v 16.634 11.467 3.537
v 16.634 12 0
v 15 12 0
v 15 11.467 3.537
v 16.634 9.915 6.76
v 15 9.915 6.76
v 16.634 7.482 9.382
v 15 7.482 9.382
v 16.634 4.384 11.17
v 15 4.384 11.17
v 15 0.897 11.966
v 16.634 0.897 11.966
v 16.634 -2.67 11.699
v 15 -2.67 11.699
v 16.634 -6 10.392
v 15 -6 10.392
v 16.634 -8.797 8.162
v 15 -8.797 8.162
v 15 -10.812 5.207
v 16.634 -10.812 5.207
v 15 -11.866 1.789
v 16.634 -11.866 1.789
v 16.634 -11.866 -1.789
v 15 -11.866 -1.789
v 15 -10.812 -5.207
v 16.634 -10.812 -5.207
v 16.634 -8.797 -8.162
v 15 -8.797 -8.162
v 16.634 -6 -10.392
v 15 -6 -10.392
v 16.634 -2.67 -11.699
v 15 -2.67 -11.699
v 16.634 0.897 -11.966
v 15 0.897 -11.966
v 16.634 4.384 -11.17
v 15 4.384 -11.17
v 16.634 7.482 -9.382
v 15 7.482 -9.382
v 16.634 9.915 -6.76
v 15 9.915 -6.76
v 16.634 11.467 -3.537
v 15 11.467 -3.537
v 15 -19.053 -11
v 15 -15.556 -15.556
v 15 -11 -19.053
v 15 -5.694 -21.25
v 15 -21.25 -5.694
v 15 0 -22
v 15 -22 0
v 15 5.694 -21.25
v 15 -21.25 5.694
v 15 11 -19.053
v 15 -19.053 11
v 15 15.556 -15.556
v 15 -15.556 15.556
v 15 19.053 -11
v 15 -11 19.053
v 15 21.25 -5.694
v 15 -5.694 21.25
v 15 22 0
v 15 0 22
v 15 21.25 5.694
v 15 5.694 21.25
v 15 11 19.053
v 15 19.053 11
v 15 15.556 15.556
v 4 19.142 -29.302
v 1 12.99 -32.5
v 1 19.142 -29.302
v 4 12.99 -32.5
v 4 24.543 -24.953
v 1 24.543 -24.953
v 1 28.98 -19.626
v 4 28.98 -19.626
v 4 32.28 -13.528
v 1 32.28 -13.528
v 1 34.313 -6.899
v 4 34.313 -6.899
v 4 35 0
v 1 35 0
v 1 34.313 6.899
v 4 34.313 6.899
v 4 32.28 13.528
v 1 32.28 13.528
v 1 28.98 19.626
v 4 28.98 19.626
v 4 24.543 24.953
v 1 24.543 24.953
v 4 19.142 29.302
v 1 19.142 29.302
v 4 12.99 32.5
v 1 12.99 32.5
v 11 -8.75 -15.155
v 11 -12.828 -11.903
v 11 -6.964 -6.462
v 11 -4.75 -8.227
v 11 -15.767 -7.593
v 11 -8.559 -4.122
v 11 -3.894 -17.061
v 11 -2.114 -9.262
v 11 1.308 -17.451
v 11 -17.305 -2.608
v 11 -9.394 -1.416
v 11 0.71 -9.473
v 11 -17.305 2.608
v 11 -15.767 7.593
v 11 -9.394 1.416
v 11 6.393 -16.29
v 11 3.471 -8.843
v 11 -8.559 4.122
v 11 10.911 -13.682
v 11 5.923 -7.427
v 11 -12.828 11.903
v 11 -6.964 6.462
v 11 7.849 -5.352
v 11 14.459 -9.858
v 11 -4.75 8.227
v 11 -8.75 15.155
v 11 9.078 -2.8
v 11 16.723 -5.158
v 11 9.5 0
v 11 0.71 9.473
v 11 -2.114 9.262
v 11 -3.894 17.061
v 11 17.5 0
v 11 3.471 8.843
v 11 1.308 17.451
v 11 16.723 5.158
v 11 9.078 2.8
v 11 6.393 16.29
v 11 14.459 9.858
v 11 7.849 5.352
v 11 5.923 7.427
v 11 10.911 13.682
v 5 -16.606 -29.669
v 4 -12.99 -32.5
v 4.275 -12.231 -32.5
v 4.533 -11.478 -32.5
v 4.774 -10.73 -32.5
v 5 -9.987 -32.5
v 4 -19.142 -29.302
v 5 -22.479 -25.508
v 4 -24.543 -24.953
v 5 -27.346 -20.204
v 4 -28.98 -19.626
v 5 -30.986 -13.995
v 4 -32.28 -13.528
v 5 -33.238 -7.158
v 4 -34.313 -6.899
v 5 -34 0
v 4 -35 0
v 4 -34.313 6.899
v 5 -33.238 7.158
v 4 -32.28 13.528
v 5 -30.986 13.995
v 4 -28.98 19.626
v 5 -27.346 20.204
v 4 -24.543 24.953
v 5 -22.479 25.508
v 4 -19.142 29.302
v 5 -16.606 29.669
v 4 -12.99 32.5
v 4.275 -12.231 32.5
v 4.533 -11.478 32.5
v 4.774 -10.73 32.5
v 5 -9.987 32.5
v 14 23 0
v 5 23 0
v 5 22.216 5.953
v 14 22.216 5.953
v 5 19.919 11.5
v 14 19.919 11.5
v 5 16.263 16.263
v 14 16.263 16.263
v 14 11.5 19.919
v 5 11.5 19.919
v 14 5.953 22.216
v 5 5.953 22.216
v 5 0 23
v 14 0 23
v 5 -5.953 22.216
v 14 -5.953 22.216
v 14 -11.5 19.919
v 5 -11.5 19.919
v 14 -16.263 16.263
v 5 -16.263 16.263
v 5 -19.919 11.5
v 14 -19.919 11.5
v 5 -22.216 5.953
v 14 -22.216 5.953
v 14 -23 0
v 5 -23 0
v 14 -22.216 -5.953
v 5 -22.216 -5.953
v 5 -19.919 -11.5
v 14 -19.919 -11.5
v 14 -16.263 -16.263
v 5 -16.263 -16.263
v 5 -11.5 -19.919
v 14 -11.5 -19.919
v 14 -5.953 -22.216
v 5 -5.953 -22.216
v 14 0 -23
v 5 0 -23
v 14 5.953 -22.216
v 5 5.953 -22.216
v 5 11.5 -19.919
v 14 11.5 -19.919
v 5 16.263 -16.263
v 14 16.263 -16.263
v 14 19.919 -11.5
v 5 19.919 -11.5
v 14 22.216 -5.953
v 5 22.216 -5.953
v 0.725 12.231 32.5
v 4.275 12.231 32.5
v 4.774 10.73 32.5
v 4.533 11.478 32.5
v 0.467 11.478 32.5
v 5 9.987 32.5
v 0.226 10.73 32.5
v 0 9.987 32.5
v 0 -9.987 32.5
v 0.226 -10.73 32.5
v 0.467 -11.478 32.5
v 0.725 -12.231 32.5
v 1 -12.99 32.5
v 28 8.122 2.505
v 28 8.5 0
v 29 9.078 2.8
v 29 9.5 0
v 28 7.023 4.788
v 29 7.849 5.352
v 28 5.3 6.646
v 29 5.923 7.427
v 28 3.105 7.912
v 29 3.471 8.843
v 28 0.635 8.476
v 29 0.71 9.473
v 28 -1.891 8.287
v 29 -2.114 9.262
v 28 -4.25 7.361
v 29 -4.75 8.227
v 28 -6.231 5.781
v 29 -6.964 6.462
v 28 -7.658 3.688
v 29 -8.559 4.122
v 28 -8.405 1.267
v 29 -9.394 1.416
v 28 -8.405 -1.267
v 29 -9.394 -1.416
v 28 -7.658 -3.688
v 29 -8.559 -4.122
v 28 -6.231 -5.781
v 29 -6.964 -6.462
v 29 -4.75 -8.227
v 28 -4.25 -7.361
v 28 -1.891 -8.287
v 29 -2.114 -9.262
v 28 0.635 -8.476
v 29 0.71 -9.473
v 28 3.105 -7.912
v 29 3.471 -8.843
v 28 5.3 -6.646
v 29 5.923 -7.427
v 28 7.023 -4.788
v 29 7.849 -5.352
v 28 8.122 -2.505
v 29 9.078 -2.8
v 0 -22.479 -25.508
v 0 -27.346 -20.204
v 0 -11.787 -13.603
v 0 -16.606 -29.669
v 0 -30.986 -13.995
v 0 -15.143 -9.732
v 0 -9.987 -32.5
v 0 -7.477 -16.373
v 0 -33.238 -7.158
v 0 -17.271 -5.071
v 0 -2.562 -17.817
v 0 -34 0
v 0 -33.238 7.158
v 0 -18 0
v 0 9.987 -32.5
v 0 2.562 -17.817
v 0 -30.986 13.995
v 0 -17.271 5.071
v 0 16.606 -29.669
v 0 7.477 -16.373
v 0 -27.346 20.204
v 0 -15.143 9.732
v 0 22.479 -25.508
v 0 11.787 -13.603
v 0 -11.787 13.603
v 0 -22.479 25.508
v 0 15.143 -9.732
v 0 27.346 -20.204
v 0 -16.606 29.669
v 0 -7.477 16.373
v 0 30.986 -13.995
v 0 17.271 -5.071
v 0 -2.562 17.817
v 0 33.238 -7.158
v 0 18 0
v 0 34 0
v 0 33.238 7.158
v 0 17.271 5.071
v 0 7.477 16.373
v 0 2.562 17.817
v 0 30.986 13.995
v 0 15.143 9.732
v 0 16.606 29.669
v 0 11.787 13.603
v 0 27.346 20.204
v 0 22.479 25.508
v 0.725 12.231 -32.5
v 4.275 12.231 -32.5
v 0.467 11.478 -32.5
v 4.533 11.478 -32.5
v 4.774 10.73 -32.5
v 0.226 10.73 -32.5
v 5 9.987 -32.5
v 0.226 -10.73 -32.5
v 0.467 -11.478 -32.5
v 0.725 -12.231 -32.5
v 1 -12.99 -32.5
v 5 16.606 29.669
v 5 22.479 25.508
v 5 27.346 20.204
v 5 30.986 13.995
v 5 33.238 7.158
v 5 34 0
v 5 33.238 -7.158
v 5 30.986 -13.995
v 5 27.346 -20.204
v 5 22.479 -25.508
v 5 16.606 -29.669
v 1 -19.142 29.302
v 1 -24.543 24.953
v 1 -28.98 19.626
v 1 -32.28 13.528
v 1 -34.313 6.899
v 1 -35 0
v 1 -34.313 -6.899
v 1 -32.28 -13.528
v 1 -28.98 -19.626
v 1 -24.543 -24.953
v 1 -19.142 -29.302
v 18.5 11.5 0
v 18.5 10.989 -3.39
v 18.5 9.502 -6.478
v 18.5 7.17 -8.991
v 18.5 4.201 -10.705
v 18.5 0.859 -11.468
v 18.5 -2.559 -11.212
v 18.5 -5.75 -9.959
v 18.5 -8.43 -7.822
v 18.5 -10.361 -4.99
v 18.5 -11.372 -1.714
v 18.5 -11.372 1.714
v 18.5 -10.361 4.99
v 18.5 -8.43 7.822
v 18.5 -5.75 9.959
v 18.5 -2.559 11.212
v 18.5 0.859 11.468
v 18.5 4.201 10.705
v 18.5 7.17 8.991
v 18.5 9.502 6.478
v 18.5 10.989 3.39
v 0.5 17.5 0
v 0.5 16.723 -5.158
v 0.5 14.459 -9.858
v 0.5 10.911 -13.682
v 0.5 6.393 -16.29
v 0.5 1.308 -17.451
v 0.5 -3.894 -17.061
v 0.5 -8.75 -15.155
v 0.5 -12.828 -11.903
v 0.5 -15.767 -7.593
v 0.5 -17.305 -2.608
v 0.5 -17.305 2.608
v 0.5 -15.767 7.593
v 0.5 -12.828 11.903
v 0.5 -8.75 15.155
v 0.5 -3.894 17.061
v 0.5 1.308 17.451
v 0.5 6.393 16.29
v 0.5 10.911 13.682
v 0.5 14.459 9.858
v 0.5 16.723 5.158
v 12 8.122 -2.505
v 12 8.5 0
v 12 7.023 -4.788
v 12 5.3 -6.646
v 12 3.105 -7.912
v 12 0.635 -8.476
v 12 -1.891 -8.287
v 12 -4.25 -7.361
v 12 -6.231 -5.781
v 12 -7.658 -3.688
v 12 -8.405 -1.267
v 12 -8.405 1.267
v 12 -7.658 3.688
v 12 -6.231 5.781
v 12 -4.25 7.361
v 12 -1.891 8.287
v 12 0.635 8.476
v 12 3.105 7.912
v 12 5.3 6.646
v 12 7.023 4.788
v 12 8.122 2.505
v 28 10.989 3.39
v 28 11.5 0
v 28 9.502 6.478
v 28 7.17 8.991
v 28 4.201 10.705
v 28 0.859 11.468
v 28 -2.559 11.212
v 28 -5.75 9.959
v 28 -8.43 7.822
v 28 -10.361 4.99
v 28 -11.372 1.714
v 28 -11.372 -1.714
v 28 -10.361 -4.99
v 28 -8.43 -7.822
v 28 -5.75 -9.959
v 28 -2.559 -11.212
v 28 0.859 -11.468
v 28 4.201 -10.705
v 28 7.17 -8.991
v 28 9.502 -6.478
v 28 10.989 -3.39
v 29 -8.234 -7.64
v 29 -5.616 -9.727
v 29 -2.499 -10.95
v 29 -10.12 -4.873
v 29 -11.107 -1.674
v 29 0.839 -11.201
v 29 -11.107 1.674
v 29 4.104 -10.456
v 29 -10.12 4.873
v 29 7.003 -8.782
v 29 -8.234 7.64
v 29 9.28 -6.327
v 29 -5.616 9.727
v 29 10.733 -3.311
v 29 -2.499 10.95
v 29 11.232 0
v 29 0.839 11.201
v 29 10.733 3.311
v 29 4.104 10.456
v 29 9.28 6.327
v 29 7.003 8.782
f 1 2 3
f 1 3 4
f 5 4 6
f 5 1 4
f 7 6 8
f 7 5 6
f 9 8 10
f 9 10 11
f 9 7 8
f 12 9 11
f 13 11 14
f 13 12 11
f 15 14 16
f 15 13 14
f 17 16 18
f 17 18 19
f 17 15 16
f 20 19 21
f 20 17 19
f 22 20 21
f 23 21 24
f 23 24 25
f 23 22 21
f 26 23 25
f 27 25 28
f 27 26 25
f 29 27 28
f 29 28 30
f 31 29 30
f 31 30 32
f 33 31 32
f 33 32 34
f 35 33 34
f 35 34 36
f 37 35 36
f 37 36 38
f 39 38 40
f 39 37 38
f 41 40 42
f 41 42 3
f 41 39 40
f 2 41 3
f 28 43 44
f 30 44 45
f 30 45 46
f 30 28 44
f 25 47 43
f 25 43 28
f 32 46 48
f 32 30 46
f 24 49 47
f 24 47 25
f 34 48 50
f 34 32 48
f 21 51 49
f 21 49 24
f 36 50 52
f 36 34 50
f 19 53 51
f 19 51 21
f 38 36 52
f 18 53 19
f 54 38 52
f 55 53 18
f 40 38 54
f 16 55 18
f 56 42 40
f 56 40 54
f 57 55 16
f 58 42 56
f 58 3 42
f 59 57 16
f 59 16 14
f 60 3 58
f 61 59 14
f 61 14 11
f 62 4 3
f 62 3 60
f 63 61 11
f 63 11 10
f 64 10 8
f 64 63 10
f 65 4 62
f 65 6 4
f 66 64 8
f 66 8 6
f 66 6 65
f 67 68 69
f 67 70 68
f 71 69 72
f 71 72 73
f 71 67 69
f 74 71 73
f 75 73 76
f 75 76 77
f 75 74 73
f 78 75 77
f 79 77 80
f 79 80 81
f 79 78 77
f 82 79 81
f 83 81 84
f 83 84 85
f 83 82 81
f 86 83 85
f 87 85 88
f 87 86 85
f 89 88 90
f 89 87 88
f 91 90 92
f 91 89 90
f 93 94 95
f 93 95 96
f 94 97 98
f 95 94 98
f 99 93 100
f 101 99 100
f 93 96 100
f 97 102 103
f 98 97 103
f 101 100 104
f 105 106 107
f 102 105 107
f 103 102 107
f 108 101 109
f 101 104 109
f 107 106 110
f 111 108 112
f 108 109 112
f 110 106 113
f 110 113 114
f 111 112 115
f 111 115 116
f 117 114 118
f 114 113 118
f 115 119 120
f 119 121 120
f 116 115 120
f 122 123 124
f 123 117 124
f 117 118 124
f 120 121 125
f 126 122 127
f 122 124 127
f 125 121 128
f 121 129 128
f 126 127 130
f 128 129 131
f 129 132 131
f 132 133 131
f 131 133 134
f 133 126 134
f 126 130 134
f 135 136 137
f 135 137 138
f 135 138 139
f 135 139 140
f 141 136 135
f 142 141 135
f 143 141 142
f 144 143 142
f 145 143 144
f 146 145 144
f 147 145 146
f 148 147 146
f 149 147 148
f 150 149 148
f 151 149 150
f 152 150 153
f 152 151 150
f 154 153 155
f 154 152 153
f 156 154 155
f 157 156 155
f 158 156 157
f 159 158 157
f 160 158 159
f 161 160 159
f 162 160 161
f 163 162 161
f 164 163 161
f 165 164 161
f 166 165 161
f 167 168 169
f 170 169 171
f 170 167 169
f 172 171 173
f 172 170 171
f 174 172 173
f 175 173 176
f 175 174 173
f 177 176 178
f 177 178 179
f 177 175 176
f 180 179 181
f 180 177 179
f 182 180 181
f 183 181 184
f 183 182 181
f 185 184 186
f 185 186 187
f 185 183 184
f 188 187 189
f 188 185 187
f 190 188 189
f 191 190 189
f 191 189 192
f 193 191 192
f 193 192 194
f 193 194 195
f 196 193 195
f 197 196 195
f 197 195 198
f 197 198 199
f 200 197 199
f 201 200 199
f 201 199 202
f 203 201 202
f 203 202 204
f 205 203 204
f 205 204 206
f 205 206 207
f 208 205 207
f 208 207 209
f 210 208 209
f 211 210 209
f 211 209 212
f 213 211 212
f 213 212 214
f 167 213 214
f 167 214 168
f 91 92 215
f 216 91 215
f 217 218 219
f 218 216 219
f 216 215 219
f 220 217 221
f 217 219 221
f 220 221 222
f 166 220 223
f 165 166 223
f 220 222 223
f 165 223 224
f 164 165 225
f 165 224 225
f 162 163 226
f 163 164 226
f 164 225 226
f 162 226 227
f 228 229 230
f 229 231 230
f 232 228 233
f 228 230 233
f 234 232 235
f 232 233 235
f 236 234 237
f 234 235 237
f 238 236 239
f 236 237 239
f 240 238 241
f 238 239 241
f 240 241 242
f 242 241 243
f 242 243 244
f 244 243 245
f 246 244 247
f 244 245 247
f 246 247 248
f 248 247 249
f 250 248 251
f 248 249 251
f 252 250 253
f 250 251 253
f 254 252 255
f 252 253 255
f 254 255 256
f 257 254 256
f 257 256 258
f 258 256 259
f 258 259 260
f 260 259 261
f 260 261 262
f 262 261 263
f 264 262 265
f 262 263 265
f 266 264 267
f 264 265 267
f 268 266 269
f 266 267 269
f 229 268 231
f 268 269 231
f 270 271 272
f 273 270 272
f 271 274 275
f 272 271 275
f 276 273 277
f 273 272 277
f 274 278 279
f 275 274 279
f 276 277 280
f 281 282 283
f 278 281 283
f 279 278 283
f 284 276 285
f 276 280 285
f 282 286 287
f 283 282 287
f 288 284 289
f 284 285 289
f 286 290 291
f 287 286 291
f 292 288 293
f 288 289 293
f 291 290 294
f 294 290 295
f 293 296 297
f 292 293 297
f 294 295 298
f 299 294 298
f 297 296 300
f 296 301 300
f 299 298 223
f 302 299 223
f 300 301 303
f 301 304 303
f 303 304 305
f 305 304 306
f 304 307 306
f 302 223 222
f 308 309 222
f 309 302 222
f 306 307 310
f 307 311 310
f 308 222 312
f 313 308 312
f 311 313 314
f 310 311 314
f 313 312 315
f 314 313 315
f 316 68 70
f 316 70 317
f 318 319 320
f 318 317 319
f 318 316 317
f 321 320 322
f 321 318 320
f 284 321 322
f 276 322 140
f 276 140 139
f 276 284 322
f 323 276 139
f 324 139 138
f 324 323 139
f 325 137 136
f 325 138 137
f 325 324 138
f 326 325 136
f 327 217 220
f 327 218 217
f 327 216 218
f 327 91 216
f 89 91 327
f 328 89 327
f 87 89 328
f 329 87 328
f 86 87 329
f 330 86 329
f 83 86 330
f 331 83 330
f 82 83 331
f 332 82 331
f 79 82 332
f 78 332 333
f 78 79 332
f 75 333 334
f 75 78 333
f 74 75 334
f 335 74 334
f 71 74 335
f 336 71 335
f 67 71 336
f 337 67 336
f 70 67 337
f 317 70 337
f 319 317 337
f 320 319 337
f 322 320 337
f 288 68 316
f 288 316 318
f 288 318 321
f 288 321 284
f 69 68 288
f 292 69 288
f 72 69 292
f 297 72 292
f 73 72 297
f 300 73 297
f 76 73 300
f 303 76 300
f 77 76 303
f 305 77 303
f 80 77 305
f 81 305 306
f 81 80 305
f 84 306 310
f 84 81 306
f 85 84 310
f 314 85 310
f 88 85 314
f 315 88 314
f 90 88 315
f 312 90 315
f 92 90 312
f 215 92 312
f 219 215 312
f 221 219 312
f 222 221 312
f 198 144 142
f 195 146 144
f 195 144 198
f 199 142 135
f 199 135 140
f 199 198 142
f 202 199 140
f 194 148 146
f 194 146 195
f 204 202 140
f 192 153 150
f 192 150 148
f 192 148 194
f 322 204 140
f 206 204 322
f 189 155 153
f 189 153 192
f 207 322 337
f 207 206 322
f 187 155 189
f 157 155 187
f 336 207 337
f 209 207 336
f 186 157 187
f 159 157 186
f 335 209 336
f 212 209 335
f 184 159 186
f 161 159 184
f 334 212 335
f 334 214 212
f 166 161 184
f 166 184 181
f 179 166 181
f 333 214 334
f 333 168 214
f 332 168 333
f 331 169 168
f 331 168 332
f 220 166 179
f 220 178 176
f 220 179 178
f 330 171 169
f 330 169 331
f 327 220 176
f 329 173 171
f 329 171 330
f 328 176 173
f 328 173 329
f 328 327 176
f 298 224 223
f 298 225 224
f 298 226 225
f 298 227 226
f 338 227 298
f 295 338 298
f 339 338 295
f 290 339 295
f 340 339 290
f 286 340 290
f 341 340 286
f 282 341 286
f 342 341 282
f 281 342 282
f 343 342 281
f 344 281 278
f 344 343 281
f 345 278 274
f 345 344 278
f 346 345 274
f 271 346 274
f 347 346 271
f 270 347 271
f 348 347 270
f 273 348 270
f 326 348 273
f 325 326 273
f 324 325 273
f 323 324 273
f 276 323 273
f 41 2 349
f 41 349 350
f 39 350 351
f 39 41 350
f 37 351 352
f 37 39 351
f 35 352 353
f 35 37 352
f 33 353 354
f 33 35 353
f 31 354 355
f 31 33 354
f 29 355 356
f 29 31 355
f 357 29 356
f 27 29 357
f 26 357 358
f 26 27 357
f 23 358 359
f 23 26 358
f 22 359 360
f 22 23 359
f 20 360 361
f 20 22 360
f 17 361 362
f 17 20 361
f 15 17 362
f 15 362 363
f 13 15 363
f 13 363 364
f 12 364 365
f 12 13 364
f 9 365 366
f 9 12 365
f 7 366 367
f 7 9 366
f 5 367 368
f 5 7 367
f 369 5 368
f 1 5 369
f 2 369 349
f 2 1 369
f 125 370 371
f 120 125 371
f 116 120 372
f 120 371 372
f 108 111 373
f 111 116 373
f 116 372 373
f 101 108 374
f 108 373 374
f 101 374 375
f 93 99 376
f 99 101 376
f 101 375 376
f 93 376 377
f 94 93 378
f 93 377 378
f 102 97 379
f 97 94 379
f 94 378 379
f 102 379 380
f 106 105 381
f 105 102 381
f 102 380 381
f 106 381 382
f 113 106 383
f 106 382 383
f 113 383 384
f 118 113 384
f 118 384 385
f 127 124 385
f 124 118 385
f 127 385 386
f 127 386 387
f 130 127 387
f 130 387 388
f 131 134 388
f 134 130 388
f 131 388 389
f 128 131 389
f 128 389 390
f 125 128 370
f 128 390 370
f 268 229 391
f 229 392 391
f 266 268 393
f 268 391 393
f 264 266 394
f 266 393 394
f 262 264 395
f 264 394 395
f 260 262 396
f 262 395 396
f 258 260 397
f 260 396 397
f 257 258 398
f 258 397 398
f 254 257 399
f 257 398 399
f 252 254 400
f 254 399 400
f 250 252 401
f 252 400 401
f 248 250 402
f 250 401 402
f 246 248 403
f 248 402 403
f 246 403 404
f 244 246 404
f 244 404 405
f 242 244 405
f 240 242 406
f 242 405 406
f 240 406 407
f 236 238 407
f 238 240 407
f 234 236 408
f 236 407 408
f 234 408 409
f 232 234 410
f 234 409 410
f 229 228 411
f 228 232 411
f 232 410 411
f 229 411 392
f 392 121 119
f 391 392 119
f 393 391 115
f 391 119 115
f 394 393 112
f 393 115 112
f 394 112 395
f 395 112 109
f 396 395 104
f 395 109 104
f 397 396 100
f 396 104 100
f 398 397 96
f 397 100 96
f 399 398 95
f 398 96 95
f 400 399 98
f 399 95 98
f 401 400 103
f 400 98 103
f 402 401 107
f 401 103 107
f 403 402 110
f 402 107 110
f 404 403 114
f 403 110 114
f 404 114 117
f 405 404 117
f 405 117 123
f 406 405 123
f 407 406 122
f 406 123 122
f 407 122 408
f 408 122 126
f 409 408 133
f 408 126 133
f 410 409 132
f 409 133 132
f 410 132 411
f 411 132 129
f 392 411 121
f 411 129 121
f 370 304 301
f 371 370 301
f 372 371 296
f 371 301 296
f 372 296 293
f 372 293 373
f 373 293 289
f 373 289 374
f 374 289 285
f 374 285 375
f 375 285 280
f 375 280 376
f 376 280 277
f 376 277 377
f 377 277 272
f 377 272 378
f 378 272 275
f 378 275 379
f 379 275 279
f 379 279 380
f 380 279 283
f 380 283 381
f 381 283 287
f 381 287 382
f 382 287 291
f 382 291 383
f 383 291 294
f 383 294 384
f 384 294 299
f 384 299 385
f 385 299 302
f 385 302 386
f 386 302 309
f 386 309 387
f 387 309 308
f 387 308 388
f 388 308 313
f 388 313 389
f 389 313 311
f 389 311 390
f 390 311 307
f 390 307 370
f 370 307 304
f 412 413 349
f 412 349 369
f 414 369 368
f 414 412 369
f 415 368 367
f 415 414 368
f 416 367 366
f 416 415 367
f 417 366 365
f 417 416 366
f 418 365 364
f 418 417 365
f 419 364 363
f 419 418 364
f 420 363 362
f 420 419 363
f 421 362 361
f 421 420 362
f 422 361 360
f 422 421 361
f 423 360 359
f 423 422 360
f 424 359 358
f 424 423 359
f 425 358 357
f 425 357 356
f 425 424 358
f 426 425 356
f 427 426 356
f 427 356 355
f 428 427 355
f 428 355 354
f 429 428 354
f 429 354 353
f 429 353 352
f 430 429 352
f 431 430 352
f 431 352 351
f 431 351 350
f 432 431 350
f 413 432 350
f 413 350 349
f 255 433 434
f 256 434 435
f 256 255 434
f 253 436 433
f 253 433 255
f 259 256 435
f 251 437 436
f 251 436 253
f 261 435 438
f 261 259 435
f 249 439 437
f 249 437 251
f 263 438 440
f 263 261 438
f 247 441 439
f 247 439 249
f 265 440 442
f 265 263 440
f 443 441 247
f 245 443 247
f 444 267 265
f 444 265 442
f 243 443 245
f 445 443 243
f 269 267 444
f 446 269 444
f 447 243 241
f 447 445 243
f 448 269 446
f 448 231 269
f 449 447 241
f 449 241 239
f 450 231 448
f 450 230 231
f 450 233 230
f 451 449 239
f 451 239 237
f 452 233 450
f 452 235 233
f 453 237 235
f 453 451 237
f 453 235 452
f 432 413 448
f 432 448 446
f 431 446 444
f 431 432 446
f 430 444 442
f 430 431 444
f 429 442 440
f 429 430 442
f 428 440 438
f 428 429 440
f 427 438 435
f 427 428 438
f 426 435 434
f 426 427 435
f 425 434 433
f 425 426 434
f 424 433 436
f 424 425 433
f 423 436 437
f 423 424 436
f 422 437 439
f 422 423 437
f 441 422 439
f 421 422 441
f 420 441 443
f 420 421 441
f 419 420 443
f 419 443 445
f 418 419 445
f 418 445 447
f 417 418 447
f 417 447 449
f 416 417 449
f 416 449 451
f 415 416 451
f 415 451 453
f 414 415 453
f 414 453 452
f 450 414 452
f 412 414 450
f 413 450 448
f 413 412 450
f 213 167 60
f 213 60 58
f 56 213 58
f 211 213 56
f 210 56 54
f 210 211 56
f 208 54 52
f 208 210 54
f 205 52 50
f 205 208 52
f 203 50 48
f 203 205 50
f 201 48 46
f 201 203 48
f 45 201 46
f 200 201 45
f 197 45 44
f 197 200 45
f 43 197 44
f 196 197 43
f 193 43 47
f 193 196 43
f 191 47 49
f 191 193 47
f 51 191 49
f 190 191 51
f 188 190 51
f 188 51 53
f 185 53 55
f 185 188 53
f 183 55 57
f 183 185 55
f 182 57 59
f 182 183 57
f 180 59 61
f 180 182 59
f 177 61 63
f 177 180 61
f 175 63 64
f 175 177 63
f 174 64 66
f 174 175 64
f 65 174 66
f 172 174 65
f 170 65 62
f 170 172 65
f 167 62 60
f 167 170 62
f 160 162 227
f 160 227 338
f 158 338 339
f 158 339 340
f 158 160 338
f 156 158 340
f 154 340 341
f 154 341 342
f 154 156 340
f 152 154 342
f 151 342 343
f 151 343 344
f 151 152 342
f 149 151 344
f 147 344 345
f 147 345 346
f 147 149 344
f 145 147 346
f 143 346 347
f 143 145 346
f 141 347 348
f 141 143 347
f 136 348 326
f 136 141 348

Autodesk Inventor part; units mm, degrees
ref_plane "YZ Plane" through (0, 0, 0) normal (1, 0, 0) x (0, 1, 0)
ref_plane "XZ Plane" through (0, 0, 0) normal (0, 1, 0) x (-1, 0, 0)
ref_plane "XY Plane" through (0, 0, 0) normal (0, 0, 1) x (1, 0, 0)
sketch "Náčrt1" plane through (0, 0, 0) normal (0, 0, 1) x (1, 0, 0)
  line L0 (0, 0) -> (16.9868, 0)
  line L1 (0, 17.5) -> (0, 35)
  line L2 (5, 23) -> (15, 23)
  line L3 (15, 23) -> (15, 12)
  line L4 (15, 12) -> (16.634, 12)
  line L5 (16.634, 12) -> (18.5, 11.5)
  line L6 (18.5, 11.5) -> (29, 11.5)
  line L7 (29, 11.5) -> (29, 8.5)
  line L8 (29, 8.5) -> (11, 8.5)
  line L9 (11, 8.5) -> (11, 17.5)
  line L10 (11, 17.5) -> (0, 17.5)
  line L11 (0, 35) -> (5, 35)
  line L12 (5, 35) -> (5, 23)
  dimension "d0" = 29
  dimension "d2" = 10.5
  dimension "d5" = 14
  dimension "d8" = 46
  dimension "d10" = 24
  dimension "d11" = 23
  dimension "d12" = 17
  dimension "d13" = 35
  dimension "d14" = 11
  dimension "d15" = 15
  dimension "d40" = 12.366
  dimension "d53" = 70
  dimension "d54" = 24
revolve "Rotace1" add sketch "Náčrt1" angle 360 about axis through (0, 0, 0) along (1, 0, 0)
chamfer "Zkosení3" distance 1 angle 45 1 edges at (15, -23, 0)
chamfer "Zkosení5" distance 1 angle 15 1 edges at (29, -11.5, 0) measured on face at (25.5, 11.4627, -0.9254)
chamfer "Zkosení6" distance 0.5 angle 45 1 edges at (0, -17.5, 0)
chamfer "Zkosení8" distance 1 angle 45 1 edges at (29, -8.5, 0)
chamfer "Zkosení9" distance 1 angle 45 1 edges at (11, -8.5, 0)
chamfer "Zkosení11" distance 1 angle 45 1 edges at (5, -35, 0)
chamfer "Zkosení12" distance 1 angle 45 1 edges at (0, -35, 0)
sketch "Náčrt3" plane through (0, 0, 0) normal (-1, 0, 0) x (0, 0, 1)
  line L0 (-39.3312, 12.9904) -> (-32.5, 12.9904)
  line L1 (-32.5, 12.9904) -> (-32.5, -12.9904)
  line L2 (-32.5, -12.9904) -> (-39.3312, -12.9904)
  line L3 (-39.3312, -12.9904) -> (-39.3312, 12.9904)
  line L4 (52.9331, 12.9904) -> (32.5, 12.9904)
  line L5 (32.5, 12.9904) -> (32.5, -12.9904)
  line L6 (32.5, -12.9904) -> (52.9331, -12.9904)
  line L7 (52.9331, -12.9904) -> (52.9331, 12.9904)
  line L8 (0, 0) -> (0, -6.1481) construction
  circle A0 centre (0, 0) radius 35 construction
  dimension "d61" = 65
extrude "Vysunutí2" cut sketch "Náčrt3" against normal through all
equation "\"Rozmer_B\" = 0"
equation "\"Rozmer_C\" = 0"
equation "\"Rozmer_D\" = d0"
properties part number "NA-45-h-Crown-247" material "12 060.4"
